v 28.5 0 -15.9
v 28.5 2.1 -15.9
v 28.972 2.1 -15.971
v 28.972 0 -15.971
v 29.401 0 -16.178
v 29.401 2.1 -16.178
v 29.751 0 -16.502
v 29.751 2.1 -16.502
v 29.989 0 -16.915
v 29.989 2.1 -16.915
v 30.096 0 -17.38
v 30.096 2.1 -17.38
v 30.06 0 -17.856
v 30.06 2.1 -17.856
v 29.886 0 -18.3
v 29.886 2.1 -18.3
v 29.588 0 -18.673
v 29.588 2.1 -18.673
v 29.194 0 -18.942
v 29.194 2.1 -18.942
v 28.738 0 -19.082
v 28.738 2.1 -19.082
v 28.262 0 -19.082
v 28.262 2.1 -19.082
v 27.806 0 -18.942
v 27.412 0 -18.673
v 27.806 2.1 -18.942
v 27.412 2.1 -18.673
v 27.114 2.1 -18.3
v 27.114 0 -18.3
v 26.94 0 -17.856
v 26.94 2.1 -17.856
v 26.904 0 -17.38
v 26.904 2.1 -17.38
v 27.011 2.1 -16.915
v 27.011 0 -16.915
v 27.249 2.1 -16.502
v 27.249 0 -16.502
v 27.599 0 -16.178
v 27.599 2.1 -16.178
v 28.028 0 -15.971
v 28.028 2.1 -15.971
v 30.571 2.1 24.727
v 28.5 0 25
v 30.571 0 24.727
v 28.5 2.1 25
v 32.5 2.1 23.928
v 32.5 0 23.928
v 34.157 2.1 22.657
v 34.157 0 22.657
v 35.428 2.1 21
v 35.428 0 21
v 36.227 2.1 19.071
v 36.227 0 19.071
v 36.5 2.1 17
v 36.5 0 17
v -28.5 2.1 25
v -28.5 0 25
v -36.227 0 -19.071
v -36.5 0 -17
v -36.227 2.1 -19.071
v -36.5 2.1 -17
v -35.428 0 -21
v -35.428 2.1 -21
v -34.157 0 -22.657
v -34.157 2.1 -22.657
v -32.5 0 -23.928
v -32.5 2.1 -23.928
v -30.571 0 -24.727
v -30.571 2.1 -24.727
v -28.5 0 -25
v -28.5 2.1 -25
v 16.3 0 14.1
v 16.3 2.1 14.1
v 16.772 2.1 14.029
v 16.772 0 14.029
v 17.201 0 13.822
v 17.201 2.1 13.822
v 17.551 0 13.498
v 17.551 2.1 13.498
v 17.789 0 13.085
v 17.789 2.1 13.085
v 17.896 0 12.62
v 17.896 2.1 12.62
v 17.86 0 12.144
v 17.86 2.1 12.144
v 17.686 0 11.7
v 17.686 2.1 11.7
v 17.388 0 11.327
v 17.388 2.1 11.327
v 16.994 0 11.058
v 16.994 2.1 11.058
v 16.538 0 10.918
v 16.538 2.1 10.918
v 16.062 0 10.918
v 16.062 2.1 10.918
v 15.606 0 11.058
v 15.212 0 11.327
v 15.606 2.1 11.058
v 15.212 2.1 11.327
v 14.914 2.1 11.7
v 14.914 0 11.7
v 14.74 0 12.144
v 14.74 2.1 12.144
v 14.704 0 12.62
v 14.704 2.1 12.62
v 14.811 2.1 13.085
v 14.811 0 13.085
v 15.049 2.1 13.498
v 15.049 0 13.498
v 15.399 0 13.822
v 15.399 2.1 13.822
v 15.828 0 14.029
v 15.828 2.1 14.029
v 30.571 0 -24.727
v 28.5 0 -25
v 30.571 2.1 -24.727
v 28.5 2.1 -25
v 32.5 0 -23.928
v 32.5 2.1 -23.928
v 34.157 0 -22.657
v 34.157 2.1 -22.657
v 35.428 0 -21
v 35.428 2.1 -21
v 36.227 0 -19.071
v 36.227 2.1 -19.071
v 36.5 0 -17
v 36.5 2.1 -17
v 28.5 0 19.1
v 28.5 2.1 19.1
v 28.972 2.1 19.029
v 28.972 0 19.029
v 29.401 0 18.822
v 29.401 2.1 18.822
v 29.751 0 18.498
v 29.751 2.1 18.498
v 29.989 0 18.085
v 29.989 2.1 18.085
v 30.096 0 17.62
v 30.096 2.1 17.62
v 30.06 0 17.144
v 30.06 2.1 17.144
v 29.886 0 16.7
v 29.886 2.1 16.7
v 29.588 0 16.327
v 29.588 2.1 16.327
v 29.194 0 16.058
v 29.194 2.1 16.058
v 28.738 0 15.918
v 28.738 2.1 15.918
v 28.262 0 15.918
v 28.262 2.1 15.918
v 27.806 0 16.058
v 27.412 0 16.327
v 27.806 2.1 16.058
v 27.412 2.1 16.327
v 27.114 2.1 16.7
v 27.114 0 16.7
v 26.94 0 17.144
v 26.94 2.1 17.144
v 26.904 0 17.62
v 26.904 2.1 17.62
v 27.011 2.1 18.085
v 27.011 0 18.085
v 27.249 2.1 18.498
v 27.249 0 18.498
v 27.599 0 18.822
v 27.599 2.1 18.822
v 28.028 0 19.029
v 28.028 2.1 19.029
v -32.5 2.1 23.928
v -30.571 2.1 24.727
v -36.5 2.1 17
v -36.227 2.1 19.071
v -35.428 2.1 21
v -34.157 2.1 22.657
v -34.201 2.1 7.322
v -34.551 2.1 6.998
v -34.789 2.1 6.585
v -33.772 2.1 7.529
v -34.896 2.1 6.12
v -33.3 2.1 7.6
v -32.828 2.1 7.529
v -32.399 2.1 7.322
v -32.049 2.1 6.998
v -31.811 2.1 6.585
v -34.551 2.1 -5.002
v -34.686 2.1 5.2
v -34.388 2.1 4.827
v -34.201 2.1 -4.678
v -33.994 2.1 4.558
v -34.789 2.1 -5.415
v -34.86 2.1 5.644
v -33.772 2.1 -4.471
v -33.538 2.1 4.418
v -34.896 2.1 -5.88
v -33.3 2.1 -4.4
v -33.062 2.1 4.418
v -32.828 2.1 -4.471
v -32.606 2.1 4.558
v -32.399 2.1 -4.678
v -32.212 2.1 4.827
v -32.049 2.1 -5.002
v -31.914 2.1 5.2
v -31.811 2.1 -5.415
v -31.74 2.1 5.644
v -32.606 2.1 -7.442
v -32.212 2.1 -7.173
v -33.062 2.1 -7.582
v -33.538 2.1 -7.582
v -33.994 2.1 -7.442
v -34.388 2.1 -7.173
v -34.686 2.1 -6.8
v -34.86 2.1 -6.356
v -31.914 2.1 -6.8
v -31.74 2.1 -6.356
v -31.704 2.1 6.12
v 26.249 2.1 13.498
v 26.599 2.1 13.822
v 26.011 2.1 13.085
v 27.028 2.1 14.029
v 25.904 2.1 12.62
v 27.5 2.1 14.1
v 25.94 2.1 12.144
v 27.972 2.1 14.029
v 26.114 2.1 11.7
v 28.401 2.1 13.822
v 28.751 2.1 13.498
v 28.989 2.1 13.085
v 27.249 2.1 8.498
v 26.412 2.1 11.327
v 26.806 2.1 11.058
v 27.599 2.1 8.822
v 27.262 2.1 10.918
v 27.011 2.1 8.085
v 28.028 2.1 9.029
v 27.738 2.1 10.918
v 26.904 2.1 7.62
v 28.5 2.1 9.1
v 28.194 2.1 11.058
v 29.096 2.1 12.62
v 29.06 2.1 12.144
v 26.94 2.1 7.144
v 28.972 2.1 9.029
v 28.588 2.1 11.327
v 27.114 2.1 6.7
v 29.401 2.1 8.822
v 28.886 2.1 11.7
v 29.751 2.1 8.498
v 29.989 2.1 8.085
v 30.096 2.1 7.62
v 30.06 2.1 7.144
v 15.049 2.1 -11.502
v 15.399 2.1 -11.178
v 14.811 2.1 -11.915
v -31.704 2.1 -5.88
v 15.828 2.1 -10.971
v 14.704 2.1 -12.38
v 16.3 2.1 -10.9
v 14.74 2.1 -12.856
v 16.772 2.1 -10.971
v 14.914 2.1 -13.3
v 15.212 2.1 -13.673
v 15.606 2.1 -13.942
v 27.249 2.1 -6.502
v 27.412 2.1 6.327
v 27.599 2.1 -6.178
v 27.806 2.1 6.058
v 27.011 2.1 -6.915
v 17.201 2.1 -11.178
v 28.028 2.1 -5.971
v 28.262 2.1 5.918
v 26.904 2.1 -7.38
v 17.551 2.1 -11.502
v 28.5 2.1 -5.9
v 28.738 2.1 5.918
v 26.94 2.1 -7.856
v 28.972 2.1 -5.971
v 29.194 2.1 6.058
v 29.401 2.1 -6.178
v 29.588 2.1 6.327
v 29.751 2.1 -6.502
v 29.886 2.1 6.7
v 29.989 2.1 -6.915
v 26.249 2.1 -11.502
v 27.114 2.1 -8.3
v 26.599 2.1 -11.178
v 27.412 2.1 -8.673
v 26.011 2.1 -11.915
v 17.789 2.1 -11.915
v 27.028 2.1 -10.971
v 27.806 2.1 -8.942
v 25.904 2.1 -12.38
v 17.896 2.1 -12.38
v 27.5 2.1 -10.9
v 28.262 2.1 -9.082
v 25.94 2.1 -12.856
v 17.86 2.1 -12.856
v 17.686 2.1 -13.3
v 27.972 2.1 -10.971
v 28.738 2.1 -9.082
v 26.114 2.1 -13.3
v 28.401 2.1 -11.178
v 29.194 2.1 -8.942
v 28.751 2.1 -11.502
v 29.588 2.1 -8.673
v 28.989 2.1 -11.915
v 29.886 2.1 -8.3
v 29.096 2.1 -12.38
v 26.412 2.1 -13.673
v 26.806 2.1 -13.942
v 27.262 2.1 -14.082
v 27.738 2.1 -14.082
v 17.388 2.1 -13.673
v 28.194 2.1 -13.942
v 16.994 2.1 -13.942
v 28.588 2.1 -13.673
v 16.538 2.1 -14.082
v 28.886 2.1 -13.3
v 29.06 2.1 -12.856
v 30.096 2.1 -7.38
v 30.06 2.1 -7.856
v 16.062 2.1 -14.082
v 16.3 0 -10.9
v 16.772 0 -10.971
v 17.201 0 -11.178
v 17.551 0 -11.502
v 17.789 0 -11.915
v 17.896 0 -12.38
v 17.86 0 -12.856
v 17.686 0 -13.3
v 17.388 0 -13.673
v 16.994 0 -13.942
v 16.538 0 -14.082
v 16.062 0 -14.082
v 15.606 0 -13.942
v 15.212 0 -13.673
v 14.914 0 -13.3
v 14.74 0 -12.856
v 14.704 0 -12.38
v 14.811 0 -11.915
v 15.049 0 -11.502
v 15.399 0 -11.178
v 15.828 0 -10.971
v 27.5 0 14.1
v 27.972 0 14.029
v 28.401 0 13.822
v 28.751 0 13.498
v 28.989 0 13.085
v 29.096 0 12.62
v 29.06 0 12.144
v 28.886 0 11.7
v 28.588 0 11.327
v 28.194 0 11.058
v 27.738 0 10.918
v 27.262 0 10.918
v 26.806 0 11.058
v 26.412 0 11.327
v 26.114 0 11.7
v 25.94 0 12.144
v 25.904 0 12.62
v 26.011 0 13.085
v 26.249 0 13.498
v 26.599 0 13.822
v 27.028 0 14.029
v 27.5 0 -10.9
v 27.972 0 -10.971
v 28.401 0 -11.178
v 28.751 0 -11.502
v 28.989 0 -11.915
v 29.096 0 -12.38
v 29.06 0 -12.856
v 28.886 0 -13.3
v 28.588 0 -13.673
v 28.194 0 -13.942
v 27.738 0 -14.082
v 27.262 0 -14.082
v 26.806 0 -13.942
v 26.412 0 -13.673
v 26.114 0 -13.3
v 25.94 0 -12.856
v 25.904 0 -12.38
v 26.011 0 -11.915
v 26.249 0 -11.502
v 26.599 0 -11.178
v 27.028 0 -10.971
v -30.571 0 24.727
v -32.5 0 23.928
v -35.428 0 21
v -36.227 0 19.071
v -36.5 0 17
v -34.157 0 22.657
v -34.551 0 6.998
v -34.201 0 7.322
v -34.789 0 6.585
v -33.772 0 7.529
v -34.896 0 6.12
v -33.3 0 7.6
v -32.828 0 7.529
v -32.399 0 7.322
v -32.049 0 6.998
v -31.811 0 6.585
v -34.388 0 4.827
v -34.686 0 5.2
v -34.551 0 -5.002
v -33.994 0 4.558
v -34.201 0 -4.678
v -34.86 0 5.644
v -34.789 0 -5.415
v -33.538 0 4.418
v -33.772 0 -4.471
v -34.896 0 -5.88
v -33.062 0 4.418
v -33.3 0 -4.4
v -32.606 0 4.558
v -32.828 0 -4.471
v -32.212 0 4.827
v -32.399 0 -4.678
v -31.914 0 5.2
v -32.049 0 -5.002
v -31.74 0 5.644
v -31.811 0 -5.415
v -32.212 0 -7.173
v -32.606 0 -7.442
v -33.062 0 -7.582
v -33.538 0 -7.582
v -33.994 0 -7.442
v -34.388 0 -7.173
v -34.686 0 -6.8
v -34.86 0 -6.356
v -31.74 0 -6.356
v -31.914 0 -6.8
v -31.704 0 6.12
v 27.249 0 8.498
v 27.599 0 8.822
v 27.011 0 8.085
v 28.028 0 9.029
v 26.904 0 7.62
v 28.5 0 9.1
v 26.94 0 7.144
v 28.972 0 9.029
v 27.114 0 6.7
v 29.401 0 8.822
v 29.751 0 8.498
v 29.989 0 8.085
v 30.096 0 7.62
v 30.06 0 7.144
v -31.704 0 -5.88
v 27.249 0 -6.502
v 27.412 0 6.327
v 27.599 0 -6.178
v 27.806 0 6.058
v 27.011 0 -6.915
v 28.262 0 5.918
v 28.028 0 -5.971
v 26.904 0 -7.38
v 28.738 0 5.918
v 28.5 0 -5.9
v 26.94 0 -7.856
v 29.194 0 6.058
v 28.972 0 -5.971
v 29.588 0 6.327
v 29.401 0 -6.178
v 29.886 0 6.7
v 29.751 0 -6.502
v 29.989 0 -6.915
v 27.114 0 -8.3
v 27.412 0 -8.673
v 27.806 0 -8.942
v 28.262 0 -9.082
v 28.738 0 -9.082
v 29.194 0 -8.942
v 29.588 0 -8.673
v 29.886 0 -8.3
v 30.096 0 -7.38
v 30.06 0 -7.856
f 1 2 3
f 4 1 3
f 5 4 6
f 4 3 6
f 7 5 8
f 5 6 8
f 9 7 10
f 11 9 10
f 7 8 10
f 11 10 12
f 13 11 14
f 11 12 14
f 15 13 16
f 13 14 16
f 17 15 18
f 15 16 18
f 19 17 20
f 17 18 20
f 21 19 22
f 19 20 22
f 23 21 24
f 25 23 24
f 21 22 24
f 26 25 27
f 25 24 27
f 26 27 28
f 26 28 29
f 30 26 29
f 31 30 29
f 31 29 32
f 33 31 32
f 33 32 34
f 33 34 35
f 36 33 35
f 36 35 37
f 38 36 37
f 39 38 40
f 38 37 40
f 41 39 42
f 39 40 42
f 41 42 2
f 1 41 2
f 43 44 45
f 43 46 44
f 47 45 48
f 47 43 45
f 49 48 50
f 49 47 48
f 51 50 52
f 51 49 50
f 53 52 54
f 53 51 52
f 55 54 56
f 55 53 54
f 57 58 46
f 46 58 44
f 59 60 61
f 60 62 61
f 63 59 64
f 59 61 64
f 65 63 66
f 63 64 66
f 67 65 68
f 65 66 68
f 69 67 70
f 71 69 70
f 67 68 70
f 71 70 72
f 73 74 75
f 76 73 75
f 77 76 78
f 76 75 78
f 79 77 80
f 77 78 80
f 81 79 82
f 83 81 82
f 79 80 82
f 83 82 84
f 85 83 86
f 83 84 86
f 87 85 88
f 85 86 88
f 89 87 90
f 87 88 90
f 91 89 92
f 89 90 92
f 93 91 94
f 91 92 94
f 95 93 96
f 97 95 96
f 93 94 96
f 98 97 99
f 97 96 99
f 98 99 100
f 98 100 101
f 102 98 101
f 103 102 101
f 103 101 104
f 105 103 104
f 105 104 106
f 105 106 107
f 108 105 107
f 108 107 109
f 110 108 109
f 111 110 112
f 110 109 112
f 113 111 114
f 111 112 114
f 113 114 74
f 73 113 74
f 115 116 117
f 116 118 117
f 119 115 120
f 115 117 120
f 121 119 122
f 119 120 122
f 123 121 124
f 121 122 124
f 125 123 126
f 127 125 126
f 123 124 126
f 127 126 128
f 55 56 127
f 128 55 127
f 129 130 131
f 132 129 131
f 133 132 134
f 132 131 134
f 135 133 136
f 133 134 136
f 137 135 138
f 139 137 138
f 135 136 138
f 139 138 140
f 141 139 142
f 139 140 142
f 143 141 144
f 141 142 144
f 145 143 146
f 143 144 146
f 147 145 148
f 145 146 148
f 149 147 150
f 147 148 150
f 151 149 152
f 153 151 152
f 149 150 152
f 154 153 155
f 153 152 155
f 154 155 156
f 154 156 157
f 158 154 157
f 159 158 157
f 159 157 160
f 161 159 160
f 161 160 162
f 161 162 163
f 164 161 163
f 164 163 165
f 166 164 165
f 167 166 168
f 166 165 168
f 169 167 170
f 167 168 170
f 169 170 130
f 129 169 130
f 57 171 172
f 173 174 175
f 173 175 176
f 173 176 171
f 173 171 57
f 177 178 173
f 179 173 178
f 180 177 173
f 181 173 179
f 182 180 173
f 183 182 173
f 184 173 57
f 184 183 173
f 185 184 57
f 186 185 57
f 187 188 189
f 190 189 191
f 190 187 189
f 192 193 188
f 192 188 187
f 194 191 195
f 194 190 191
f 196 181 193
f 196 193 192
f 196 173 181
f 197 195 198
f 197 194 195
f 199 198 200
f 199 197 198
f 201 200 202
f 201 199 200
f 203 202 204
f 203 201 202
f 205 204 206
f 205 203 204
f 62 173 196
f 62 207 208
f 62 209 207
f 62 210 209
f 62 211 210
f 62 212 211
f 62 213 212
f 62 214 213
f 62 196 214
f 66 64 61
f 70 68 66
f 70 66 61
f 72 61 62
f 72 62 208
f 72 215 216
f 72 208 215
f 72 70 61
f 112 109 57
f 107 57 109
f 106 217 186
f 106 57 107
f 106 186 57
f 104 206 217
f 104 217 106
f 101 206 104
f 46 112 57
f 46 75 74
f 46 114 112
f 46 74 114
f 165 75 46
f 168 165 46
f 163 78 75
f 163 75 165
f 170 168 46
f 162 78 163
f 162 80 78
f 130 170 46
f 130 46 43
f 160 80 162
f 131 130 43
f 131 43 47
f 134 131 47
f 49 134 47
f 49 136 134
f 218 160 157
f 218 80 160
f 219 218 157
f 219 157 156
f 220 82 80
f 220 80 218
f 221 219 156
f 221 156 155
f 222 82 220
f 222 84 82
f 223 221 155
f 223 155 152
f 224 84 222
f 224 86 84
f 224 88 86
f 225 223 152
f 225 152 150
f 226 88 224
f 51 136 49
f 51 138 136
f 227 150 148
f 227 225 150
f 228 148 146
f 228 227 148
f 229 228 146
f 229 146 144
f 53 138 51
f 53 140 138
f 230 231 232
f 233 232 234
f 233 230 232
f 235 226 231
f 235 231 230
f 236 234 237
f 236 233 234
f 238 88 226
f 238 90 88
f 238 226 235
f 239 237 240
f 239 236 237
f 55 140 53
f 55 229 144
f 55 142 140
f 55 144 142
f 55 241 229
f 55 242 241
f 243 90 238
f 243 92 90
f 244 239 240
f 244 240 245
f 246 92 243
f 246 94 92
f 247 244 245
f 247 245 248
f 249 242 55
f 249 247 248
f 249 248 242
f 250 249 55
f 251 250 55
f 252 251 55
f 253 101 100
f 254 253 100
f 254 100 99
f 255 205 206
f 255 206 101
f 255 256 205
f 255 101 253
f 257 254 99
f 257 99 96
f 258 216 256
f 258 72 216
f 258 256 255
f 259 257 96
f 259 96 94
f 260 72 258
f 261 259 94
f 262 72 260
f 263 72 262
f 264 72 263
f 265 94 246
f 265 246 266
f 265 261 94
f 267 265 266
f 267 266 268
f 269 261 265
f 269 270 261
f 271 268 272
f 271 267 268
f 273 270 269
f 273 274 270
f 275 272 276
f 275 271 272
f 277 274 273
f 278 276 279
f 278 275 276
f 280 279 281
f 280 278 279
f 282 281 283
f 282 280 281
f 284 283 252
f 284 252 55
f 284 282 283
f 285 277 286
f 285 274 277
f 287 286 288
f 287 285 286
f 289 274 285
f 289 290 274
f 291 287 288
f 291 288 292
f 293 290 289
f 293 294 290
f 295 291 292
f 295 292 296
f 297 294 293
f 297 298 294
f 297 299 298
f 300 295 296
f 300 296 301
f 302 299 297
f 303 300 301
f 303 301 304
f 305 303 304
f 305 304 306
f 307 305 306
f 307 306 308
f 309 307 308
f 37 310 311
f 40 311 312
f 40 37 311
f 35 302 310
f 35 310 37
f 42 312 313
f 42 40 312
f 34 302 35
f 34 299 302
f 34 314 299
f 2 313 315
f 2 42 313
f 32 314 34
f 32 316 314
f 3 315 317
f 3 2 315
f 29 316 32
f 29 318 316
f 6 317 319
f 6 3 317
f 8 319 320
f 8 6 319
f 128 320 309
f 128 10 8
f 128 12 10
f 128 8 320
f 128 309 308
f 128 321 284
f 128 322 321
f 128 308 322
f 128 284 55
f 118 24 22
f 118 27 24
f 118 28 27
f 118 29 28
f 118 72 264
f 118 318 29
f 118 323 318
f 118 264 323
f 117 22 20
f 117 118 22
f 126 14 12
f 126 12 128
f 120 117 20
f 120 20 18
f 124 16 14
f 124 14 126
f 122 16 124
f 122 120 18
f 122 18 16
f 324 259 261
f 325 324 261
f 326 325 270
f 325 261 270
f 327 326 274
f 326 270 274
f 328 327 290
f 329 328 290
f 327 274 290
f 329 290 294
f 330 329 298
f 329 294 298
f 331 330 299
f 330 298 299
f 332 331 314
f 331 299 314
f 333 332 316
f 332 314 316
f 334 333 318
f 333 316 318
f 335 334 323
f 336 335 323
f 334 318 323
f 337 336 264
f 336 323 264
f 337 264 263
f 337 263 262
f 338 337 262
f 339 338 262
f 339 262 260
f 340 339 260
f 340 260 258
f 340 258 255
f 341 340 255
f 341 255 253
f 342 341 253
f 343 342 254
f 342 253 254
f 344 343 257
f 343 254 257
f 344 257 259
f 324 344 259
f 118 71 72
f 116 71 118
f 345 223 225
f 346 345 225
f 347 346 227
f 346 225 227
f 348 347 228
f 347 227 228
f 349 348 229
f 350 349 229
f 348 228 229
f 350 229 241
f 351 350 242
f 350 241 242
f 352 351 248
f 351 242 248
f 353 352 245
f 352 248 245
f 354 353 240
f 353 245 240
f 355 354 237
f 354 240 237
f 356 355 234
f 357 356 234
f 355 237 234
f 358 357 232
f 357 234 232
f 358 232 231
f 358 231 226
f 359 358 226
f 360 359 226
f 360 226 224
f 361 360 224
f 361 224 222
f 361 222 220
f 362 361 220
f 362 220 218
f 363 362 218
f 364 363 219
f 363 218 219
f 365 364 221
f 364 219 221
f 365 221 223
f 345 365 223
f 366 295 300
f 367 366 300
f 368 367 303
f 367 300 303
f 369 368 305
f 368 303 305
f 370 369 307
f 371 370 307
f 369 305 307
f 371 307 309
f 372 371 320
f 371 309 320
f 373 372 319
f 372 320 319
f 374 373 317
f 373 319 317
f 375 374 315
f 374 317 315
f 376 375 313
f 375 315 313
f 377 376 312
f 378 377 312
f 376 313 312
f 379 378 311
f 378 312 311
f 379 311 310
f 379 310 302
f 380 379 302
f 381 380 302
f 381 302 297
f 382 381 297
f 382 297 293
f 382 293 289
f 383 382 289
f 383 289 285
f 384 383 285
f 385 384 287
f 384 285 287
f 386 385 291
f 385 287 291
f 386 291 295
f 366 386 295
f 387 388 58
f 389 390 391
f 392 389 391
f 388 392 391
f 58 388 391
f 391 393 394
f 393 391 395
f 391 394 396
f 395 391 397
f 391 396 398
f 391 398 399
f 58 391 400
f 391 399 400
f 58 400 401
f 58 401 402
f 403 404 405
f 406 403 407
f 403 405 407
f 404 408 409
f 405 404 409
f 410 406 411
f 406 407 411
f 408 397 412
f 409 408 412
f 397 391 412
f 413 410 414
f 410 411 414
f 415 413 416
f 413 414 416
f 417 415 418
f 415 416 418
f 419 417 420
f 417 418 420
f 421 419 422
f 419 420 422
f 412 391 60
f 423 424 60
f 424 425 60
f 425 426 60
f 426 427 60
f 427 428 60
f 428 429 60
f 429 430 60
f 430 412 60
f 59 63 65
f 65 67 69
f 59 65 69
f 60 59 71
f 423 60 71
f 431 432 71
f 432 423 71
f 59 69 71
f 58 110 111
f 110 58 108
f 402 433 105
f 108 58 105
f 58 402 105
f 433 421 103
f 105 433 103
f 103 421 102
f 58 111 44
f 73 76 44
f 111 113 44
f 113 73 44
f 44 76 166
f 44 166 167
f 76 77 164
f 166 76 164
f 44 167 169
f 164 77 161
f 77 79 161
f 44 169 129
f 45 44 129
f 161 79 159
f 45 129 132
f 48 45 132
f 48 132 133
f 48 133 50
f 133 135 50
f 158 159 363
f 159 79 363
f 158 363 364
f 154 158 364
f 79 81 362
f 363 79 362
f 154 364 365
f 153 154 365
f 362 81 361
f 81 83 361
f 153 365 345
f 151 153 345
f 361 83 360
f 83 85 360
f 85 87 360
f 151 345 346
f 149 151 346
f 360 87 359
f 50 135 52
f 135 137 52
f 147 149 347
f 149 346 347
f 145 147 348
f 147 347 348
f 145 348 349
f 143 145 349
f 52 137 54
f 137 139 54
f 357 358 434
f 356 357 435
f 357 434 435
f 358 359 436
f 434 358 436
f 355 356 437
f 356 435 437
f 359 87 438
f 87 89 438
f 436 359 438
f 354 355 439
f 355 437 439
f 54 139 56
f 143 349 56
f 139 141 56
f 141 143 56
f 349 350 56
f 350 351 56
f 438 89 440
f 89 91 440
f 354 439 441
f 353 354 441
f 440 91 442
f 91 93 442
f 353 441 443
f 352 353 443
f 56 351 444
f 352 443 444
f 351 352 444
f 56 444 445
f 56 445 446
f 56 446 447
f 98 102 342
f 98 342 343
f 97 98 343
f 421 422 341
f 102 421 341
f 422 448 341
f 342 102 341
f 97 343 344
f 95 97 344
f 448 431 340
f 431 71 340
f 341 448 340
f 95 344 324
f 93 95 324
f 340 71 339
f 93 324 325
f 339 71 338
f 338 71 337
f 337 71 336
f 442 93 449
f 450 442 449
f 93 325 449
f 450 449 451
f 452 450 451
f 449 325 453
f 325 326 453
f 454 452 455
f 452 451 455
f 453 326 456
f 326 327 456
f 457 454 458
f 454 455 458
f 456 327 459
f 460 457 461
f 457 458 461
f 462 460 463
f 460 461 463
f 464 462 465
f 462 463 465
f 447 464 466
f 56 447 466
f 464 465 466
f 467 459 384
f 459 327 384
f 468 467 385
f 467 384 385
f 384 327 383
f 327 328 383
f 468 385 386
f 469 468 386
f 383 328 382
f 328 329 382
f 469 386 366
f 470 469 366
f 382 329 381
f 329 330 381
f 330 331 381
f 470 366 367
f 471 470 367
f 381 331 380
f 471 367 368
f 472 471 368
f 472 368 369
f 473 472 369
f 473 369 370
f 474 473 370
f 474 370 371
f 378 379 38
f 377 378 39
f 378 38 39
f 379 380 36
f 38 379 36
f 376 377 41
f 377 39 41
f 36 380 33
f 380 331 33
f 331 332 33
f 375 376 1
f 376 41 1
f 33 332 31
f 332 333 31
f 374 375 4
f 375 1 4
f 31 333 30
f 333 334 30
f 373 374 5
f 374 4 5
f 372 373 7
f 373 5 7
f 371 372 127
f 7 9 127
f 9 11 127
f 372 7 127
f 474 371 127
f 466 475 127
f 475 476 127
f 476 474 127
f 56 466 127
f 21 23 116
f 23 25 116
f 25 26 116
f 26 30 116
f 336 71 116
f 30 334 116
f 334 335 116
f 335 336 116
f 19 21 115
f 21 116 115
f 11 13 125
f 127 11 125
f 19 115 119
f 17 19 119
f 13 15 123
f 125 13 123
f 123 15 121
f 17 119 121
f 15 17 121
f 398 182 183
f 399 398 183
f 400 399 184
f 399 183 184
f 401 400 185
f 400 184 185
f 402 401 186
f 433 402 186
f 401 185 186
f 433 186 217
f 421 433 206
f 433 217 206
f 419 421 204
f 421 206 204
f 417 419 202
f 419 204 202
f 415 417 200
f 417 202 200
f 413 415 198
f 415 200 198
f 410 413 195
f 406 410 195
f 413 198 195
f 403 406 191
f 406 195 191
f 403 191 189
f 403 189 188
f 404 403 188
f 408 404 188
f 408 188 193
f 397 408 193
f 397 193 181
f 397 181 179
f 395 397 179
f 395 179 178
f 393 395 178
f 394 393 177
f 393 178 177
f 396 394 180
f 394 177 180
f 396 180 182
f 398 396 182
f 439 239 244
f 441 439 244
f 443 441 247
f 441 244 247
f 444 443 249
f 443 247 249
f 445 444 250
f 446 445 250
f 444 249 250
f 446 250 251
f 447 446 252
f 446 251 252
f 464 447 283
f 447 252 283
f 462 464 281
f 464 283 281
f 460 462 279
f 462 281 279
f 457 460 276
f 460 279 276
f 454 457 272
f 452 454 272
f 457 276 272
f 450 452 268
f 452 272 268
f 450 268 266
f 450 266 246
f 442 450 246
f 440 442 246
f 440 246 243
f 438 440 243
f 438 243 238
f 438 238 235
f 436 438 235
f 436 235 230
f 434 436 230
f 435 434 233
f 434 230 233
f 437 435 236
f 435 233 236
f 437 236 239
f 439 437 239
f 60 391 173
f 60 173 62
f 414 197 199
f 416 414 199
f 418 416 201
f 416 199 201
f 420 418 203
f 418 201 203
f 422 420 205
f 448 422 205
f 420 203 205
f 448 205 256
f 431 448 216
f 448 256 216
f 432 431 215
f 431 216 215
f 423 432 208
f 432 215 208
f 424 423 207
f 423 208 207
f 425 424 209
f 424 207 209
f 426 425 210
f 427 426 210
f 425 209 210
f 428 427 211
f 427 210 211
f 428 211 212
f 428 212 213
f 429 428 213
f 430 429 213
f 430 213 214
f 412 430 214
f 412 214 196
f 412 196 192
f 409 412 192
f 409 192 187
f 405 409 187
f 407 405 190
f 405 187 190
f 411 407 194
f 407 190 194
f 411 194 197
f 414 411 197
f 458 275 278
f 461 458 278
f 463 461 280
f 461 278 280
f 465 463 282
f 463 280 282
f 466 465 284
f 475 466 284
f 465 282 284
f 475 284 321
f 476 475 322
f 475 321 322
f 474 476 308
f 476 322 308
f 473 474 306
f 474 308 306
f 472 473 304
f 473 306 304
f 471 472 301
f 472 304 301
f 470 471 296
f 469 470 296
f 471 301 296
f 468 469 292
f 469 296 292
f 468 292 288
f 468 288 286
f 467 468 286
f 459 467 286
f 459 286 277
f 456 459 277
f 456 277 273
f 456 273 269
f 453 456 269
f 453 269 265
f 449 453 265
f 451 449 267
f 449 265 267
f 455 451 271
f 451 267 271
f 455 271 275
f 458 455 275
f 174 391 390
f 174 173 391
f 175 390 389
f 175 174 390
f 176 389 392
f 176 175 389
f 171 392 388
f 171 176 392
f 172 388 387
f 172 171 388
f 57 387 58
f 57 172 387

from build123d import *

# Parameters (mm, degrees)
SKETCH_1_W          = 73
SKETCH_1_H          = 50
EXTRUDE_1_DEPTH     = 2.1
SKETCH_2_R          = 1.6
CUT_EXTRUDE_1_DEPTH = 2.1
SKETCH_3_R          = 1.6
CUT_EXTRUDE_2_DEPTH = 2.1
SKETCH_4_R          = 1.6
CUT_EXTRUDE_3_DEPTH = 2.1
FILLET_1_R          = 8


with BuildPart() as part:
    # 草图1 → 凸台-拉伸1 (new body)
    with BuildSketch(Plane(origin=(0, 0, 0), x_dir=(1, 0, 0), z_dir=(0, 1, 0))):
        Rectangle(SKETCH_1_W, SKETCH_1_H)
    extrude(amount=EXTRUDE_1_DEPTH)

    # 草图2 → 切除-拉伸1 (cut)
    with BuildSketch(Plane(origin=(0, 2.1, 0), x_dir=(1, 0, 0), z_dir=(0, 1, 0))):
        with Locations(Location((-33.3, 6, 0), (0, 0, 270))):
            Circle(SKETCH_2_R)
        with Locations(Location((-33.3, -6, 0), (0, 0, 270))):
            Circle(SKETCH_2_R)
    extrude(amount=-CUT_EXTRUDE_1_DEPTH, mode=Mode.SUBTRACT)

    # 草图3 → 切除-拉伸2 (cut)
    with BuildSketch(Plane(origin=(0, 2.1, 0), x_dir=(1, 0, 0), z_dir=(0, 1, 0))):
        with Locations(Location((28.5, 17.5, 0), (0, 0, 270))):
            Circle(SKETCH_3_R)
        with Locations(Location((28.5, 7.5, 0), (0, 0, 270))):
            Circle(SKETCH_3_R)
        with Locations(Location((28.5, -7.5, 0), (0, 0, 270))):
            Circle(SKETCH_3_R)
        with Locations(Location((28.5, -17.5, 0), (0, 0, 270))):
            Circle(SKETCH_3_R)
    extrude(amount=-CUT_EXTRUDE_2_DEPTH, mode=Mode.SUBTRACT)

    # 草图4 → 切除-拉伸3 (cut)
    with BuildSketch(Plane(origin=(0, 2.1, 0), x_dir=(1, 0, 0), z_dir=(0, 1, 0))):
        with Locations(Location((16.3, 12.5, 0), (0, 0, 270))):
            Circle(SKETCH_4_R)
        with Locations(Location((16.3, -12.5, 0), (0, 0, 270))):
            Circle(SKETCH_4_R)
        with Locations(Location((27.5, 12.5, 0), (0, 0, 270))):
            Circle(SKETCH_4_R)
        with Locations(Location((27.5, -12.5, 0), (0, 0, 270))):
            Circle(SKETCH_4_R)
    extrude(amount=-CUT_EXTRUDE_3_DEPTH, mode=Mode.SUBTRACT)

    # 圆角1
    fillet_1_edges = [part.edges().sort_by_distance(p)[0] for p in [
        (36.5, 1.05, 25),
        (-36.5, 1.05, 25),
        (-36.5, 1.05, -25),
        (36.5, 1.05, -25),
    ]]
    fillet(fillet_1_edges, radius=FILLET_1_R)


solid = part.part
